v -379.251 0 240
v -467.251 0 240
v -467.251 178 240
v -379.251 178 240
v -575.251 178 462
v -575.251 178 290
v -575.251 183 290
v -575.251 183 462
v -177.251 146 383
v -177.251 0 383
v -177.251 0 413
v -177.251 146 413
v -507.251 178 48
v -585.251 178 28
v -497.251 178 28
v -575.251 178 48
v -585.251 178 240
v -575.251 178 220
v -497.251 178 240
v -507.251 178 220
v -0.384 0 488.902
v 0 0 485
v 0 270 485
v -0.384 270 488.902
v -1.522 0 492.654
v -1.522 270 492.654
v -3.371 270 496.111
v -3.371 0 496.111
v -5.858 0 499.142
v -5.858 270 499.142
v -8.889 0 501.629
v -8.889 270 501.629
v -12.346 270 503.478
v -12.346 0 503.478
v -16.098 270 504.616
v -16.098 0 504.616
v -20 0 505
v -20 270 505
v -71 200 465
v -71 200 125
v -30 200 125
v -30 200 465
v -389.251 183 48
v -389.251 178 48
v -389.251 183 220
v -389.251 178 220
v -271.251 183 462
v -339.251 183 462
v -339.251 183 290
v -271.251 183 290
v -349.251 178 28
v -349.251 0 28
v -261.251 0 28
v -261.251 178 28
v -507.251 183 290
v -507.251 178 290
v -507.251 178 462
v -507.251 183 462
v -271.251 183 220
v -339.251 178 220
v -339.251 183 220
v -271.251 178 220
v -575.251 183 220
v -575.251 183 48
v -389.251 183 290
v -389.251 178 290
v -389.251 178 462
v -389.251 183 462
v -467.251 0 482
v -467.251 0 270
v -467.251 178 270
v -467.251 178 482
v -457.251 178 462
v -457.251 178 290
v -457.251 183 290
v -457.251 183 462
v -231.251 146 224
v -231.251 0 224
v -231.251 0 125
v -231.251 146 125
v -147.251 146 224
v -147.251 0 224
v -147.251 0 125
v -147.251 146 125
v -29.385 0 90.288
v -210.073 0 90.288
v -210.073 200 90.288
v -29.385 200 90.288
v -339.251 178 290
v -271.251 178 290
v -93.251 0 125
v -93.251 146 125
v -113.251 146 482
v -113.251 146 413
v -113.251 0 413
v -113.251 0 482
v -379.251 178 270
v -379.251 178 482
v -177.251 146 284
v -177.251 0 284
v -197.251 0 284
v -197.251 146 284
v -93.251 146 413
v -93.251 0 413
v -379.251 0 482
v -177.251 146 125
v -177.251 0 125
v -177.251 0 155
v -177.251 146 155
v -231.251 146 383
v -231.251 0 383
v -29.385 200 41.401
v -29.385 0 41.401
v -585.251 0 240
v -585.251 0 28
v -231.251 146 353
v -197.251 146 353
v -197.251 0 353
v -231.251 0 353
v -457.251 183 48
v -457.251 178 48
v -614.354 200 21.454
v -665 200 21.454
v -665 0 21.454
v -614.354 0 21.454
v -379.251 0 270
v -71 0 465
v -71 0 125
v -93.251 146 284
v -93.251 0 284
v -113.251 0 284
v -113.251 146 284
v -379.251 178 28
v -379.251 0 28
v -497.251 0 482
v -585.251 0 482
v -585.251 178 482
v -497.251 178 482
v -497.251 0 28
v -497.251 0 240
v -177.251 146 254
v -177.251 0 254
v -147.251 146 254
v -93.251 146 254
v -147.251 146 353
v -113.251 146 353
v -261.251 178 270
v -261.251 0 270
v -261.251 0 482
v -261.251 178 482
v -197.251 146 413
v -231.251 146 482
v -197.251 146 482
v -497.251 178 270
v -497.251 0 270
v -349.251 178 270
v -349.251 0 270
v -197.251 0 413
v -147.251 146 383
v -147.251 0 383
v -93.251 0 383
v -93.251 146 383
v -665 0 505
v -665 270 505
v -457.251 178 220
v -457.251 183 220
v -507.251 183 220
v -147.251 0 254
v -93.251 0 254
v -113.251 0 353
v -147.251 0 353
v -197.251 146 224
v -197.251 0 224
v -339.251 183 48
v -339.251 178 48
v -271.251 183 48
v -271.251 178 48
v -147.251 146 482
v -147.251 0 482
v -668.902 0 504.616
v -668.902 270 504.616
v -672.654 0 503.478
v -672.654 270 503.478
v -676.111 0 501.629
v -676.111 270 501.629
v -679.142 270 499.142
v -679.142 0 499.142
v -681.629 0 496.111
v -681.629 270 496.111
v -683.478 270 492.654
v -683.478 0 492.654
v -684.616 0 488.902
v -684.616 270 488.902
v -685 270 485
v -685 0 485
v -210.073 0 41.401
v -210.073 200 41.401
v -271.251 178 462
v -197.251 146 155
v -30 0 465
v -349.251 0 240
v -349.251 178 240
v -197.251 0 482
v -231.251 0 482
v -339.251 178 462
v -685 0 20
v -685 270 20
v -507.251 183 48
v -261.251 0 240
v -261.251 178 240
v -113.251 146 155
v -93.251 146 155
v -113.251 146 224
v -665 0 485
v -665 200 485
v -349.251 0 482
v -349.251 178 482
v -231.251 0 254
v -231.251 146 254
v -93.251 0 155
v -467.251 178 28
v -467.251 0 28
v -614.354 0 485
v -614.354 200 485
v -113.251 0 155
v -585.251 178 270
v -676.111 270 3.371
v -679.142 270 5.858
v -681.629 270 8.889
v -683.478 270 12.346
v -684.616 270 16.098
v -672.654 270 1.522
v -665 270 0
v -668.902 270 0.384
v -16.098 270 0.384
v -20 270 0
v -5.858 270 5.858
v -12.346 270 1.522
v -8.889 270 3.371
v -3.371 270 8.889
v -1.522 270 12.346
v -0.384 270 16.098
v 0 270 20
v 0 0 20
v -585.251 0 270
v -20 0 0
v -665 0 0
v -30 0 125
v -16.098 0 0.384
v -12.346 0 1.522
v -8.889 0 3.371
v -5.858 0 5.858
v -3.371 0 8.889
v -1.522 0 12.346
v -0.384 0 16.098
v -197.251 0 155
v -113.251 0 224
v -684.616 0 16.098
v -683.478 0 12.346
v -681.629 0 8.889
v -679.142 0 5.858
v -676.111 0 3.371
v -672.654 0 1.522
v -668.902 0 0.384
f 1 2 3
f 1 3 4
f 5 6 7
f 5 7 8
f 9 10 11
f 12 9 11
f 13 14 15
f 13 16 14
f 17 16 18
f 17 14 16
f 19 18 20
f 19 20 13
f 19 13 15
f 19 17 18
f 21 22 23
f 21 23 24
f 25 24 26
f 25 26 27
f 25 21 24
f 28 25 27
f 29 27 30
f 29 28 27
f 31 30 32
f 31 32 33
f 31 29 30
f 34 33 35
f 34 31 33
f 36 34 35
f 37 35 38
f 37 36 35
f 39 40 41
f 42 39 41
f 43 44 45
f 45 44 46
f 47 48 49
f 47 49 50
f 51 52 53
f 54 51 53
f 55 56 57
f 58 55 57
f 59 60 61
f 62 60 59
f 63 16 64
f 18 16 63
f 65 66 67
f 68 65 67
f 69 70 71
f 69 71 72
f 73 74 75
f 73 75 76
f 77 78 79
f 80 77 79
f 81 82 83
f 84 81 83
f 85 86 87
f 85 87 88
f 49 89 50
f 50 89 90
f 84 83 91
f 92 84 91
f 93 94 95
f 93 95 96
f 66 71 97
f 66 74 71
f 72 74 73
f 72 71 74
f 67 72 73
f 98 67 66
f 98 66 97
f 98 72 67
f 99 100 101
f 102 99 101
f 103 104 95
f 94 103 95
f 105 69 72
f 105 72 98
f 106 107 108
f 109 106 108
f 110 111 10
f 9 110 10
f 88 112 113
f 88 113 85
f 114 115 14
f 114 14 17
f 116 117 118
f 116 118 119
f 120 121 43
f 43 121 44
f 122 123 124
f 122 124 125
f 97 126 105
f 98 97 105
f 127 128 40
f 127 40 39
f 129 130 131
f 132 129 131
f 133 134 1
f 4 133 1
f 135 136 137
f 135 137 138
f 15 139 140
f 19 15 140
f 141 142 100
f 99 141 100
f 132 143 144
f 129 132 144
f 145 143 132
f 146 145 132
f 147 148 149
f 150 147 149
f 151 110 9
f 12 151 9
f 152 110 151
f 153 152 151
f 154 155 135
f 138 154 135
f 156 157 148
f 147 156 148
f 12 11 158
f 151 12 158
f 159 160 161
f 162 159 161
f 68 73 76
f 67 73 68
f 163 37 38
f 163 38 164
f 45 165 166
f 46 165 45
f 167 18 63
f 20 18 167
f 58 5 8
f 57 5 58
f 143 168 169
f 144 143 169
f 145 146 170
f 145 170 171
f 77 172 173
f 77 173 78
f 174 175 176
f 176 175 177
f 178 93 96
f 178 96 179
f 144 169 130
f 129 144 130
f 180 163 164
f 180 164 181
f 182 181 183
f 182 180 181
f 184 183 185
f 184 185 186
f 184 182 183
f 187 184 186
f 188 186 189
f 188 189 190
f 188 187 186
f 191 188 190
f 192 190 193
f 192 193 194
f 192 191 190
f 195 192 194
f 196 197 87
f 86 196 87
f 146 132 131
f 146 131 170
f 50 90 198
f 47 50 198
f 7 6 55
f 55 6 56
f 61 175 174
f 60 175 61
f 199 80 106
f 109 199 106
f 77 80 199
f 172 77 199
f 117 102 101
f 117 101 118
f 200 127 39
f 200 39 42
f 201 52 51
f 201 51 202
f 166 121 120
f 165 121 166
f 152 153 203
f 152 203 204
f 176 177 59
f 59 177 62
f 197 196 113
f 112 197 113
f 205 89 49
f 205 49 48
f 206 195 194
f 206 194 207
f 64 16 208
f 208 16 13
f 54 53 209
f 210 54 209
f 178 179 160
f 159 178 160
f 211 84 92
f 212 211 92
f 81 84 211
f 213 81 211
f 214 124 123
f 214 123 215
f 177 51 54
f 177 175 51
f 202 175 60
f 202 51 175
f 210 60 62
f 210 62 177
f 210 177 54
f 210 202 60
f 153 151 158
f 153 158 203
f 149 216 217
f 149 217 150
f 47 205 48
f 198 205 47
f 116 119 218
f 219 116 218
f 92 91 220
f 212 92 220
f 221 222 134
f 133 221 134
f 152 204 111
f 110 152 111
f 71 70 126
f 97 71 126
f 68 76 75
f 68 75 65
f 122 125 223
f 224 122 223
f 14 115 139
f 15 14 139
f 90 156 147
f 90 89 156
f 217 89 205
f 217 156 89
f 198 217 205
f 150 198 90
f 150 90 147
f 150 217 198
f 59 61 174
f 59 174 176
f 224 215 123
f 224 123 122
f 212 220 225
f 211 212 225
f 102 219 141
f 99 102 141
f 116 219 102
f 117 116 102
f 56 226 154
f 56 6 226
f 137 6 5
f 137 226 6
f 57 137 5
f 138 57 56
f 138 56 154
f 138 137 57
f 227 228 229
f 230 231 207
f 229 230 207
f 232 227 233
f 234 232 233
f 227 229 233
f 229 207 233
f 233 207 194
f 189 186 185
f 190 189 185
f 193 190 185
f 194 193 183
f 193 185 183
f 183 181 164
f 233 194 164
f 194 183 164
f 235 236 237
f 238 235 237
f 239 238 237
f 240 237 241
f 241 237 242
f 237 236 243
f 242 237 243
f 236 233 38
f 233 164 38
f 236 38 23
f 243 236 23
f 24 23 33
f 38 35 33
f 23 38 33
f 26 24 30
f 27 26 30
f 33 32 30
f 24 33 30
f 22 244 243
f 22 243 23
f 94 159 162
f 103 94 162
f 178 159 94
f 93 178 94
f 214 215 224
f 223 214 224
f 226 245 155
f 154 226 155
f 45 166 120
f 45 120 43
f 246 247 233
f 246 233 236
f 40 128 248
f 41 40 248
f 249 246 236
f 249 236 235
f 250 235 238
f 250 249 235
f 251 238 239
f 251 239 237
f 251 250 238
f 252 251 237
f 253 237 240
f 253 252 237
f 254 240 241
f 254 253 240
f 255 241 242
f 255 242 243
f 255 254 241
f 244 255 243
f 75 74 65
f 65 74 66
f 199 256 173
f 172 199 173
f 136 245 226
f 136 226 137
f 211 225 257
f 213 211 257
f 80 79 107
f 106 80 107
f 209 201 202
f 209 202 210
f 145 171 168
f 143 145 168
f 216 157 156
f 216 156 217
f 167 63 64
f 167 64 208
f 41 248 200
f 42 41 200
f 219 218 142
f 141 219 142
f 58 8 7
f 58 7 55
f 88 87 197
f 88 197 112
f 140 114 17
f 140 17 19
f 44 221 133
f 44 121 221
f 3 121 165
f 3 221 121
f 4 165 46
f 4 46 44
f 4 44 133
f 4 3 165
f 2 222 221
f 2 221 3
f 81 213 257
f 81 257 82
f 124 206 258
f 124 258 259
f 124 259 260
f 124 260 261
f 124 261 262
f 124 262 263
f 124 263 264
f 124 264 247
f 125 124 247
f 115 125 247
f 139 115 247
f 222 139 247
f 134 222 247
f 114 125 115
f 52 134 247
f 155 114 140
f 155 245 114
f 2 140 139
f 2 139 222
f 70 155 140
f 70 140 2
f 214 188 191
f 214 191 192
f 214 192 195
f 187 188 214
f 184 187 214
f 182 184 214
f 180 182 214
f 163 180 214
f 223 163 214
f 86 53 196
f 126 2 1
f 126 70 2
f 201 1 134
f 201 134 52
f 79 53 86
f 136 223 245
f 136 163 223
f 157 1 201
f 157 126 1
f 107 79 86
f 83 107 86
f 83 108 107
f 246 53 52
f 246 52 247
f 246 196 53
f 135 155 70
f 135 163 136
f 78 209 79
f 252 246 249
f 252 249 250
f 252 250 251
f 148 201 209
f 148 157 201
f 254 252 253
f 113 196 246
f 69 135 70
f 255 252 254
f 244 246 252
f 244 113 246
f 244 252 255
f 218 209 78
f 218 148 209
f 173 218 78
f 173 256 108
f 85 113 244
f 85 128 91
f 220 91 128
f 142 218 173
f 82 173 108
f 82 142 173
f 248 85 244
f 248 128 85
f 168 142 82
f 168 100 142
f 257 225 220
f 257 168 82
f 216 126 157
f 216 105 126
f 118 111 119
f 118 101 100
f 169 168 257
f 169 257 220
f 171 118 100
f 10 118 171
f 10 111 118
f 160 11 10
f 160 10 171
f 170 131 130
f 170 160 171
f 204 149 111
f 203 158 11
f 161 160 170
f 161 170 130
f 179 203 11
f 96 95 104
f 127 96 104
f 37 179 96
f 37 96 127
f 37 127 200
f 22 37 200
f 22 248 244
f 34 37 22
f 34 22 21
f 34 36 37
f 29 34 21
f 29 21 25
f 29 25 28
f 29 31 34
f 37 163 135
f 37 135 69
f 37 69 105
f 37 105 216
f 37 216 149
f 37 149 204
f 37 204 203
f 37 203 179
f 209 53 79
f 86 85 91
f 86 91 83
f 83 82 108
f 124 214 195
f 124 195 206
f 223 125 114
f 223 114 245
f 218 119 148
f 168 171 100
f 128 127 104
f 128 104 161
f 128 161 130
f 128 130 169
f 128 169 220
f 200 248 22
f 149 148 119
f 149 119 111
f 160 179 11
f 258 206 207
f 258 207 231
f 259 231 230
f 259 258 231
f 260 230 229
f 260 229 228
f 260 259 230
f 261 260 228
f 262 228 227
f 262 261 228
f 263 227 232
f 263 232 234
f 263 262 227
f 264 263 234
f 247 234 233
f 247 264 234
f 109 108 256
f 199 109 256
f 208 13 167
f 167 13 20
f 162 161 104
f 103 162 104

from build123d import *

# Parameters (mm, degrees)
F1_DEPTH = 270
F2_W     = 88
F2_H     = 212
F3_DEPTH = 178
F4_W     = 68
F4_H     = 172
F5_DEPTH = 5
F7_DEPTH = 146
F8_W     = 41
F8_H     = 340
F8_W_2   = 180.688232
F8_H_2   = 48.886035
F8_W_3   = 50.645926
F8_H_3   = 463.54628
F9_DEPTH = 200


with BuildPart() as f1:
    # F0 (on Front) → F1 (new body)
    with BuildSketch(Plane.XZ):
        with BuildLine():
            Line((-20, 505), (-665, 505))
            ThreePointArc((-665, 505), (-679.142136, 499.142136), (-685, 485))
            Line((-685, 485), (-685, 20))
            ThreePointArc((-685, 20), (-679.142136, 5.857864), (-665, 0))
            Line((-665, 0), (-20, 0))
            ThreePointArc((-20, 0), (-5.857864, 5.857864), (0, 20))
            Line((0, 20), (0, 485))
            ThreePointArc((0, 485), (-5.857864, 499.142136), (-20, 505))
        make_face()
    extrude(amount=-F1_DEPTH)

    # F2 (on face) → F3 (cut)
    with BuildSketch(Plane.XZ):
        with Locations((-541.250854, 134)):
            Rectangle(F2_W, F2_H)
        with Locations((-541.250854, 376)):
            Rectangle(F2_W, F2_H)
        with Locations((-423.250854, 134)):
            Rectangle(F2_W, F2_H)
        with Locations((-423.250854, 376)):
            Rectangle(F2_W, F2_H)
        with Locations((-305.250854, 134)):
            Rectangle(F2_W, F2_H)
        with Locations((-305.250854, 376)):
            Rectangle(F2_W, F2_H)
    extrude(amount=-F3_DEPTH, mode=Mode.SUBTRACT)

    # F4 (on face) → F5 (cut)
    with BuildSketch(Plane.XZ.offset(-178)):
        with Locations((-541.250854, 376)):
            Rectangle(F4_W, F4_H)
        with Locations((-423.250854, 376)):
            Rectangle(F4_W, F4_H)
        with Locations((-305.250854, 376)):
            Rectangle(F4_W, F4_H)
        with Locations((-305.250854, 134)):
            Rectangle(F4_W, F4_H)
        with Locations((-423.250854, 134)):
            Rectangle(F4_W, F4_H)
        with Locations((-541.250854, 134)):
            Rectangle(F4_W, F4_H)
    extrude(amount=-F5_DEPTH, mode=Mode.SUBTRACT)

    # F6 (on face) → F7 (cut)
    with BuildSketch(Plane.XZ):
        Polygon((-231.250854, 482), (-231.250854, 383), (-177.250854, 383), (-177.250854, 413), (-197.250854, 413), (-197.250854, 482), align=None)
        Polygon((-231.250854, 353), (-231.250854, 254), (-177.250854, 254), (-177.250854, 284), (-197.250854, 284), (-197.250854, 353), align=None)
        Polygon((-231.250854, 224), (-231.250854, 125), (-177.250854, 125), (-177.250854, 155), (-197.250854, 155), (-197.250854, 224), align=None)
        Polygon((-147.250854, 482), (-147.250854, 383), (-93.250854, 383), (-93.250854, 413), (-113.250854, 413), (-113.250854, 482), align=None)
        Polygon((-147.250854, 353), (-147.250854, 254), (-93.250854, 254), (-93.250854, 284), (-113.250854, 284), (-113.250854, 353), align=None)
        Polygon((-147.250854, 224), (-147.250854, 125), (-93.250854, 125), (-93.250854, 155), (-113.250854, 155), (-113.250854, 224), align=None)
    extrude(amount=-F7_DEPTH, mode=Mode.SUBTRACT)

    # F8 (on face) → F9 (cut)
    with BuildSketch(Plane.XZ):
        with Locations((-50.5, 295)):
            Rectangle(F8_W, F8_H)
        with Locations((-119.728997, 65.844511)):
            Rectangle(F8_W_2, F8_H_2)
        with Locations((-639.677037, 253.22686)):
            Rectangle(F8_W_3, F8_H_3)
    extrude(amount=-F9_DEPTH, mode=Mode.SUBTRACT)


solid = f1.part
